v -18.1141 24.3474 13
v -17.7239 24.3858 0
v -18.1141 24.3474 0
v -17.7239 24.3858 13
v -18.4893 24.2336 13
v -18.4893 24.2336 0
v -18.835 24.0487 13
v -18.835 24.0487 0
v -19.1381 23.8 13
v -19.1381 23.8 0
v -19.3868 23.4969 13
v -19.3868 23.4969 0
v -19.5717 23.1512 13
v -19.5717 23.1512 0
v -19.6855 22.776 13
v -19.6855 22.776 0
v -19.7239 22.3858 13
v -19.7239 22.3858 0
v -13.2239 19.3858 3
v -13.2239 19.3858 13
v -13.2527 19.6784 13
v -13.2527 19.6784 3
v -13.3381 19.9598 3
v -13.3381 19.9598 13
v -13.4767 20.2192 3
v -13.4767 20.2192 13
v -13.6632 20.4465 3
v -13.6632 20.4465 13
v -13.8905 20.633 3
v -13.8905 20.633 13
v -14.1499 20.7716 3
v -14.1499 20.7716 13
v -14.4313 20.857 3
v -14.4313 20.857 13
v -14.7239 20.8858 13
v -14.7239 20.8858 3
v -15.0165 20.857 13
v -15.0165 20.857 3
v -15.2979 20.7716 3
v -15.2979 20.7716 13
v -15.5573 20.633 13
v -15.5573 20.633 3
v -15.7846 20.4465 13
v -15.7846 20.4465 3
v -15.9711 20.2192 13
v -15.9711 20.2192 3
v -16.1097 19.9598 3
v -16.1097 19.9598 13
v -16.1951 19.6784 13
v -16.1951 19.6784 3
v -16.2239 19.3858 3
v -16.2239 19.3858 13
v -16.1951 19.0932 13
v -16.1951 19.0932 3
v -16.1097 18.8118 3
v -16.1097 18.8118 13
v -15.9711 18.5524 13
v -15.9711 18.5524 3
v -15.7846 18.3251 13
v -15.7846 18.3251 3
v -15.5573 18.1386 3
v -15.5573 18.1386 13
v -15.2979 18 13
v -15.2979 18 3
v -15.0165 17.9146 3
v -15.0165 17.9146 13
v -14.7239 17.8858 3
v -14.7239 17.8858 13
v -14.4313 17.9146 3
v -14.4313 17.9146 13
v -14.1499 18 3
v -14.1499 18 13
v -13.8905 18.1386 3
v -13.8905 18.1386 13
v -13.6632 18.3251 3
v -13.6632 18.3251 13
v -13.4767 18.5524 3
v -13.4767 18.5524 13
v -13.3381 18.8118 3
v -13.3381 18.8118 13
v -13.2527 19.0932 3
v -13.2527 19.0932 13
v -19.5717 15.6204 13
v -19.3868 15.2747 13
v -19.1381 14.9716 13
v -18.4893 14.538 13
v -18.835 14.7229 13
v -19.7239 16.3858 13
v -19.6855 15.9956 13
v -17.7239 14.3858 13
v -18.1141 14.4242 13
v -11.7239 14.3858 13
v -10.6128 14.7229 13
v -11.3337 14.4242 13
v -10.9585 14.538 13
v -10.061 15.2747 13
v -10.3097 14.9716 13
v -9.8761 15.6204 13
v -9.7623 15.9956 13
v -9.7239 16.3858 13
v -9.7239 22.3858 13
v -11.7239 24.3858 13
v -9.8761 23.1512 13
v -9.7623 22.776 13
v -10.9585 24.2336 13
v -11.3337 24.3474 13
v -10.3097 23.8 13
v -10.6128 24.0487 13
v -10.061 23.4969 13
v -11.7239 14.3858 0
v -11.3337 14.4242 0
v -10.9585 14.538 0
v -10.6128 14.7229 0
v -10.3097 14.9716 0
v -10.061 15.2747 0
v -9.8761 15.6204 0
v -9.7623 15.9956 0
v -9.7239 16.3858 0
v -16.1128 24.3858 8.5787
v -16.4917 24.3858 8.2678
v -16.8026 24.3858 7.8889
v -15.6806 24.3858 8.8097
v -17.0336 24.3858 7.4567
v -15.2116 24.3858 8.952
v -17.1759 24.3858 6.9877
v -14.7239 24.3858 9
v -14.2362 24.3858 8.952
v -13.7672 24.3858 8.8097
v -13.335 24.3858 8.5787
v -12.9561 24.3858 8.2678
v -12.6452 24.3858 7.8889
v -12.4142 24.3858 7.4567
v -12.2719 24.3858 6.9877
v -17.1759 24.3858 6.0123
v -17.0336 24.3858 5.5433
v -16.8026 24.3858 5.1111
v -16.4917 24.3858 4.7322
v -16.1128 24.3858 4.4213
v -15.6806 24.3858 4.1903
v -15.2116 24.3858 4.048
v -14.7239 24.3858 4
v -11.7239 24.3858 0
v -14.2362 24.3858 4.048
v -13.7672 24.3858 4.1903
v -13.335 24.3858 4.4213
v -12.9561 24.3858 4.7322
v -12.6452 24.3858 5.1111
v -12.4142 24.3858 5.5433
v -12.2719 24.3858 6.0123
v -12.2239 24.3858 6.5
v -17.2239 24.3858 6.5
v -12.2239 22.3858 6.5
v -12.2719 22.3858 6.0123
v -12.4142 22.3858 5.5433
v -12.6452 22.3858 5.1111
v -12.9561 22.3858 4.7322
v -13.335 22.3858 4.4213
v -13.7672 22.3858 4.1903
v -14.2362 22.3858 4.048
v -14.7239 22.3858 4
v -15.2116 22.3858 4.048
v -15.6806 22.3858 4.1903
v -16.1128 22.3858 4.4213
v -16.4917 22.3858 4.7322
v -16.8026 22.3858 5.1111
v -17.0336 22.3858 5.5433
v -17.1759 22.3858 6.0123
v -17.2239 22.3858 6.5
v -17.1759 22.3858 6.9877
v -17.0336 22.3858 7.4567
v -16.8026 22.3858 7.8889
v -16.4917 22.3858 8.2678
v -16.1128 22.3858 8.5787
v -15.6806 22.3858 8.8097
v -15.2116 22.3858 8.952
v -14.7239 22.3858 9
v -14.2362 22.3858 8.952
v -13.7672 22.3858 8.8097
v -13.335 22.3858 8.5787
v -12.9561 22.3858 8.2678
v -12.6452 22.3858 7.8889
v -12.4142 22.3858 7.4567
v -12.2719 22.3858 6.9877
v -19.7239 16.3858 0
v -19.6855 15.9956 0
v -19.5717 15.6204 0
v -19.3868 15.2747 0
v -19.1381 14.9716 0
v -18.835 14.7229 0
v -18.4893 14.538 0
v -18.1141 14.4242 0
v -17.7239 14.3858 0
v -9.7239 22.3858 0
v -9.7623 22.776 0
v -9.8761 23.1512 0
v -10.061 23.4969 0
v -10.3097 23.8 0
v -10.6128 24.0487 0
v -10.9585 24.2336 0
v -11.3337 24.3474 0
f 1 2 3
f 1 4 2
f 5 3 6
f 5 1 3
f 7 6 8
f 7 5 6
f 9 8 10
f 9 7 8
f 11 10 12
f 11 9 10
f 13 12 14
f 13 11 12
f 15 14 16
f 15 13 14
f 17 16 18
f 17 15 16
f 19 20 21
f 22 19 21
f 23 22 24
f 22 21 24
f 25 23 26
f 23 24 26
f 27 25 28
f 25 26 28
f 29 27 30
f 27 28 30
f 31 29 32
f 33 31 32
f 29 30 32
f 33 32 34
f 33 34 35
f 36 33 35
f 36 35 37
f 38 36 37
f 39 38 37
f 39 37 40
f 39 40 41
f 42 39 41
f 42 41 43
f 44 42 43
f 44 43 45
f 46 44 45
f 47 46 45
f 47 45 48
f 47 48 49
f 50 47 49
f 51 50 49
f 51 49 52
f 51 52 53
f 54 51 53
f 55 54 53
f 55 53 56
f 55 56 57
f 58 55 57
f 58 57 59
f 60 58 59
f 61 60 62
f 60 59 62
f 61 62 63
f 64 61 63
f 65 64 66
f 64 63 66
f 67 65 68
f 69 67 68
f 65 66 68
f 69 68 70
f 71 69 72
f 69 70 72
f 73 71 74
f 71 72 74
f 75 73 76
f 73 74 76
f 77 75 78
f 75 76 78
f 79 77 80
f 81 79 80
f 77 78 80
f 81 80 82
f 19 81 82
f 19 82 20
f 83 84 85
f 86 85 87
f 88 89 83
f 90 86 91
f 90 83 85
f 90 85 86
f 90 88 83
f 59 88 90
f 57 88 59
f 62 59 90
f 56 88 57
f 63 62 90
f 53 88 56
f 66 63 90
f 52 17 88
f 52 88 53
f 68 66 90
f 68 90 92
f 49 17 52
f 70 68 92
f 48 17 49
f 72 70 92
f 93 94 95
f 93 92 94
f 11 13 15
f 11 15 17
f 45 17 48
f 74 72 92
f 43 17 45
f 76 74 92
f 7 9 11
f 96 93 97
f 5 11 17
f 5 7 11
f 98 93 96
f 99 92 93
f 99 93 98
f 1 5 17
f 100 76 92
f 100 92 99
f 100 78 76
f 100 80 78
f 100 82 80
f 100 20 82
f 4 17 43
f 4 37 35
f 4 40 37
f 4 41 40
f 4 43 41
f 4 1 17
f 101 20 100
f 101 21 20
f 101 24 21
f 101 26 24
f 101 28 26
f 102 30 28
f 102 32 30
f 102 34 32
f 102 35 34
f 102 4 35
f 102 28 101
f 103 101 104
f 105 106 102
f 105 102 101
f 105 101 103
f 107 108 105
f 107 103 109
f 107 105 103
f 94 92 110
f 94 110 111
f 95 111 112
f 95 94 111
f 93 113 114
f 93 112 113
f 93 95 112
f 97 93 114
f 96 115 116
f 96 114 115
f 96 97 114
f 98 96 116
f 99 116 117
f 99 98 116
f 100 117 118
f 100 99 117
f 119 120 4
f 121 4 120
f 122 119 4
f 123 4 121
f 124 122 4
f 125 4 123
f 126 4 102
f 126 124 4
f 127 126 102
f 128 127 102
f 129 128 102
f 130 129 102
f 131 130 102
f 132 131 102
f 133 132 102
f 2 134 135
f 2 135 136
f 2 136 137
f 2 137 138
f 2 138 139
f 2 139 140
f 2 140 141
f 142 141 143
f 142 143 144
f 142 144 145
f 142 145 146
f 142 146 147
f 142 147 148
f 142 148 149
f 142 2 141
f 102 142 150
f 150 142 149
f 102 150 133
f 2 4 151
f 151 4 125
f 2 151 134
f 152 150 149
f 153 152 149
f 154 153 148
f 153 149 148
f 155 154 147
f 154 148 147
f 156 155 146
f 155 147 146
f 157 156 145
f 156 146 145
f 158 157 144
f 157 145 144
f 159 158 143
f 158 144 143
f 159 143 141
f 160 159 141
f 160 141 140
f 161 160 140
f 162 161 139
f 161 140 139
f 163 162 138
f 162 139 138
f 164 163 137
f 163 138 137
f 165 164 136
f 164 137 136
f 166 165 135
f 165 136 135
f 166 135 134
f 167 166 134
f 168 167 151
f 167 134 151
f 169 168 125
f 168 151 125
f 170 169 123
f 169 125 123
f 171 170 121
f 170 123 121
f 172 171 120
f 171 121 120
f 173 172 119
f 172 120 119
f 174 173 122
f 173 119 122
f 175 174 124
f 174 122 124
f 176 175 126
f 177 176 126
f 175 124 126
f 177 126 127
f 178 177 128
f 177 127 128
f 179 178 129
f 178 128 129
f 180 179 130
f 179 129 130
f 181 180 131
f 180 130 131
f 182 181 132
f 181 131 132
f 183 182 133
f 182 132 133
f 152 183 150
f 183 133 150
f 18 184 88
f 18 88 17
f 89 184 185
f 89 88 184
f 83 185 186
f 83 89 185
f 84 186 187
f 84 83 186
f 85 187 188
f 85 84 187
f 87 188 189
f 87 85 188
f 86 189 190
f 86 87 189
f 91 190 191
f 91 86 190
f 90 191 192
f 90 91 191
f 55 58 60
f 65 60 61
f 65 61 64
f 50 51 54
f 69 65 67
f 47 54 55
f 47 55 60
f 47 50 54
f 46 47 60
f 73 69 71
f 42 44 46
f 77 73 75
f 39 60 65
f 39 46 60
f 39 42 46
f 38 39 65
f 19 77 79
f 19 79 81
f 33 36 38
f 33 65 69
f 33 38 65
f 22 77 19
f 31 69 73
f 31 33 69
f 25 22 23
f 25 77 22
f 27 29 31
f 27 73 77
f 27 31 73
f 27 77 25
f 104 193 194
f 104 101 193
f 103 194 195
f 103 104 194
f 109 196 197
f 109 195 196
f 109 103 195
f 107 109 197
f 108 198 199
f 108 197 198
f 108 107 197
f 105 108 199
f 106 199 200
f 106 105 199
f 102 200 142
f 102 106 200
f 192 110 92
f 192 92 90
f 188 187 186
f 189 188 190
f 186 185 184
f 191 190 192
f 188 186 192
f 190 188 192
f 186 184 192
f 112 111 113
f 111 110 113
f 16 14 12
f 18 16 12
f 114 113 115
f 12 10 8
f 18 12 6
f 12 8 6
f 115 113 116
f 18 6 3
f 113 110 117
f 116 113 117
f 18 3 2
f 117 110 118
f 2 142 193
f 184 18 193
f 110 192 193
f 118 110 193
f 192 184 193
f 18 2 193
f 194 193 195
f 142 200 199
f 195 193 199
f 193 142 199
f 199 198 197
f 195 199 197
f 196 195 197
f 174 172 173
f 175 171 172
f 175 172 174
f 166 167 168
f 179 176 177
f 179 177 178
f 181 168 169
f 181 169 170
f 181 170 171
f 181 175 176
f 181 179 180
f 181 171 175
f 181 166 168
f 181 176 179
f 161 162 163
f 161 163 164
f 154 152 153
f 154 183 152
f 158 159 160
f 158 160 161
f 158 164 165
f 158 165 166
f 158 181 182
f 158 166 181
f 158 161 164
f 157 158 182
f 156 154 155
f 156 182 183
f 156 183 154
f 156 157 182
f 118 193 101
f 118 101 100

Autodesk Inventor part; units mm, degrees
ref_plane "YZ Plane" through (0, 0, 0) normal (1, 0, 0) x (0, 1, 0)
ref_plane "XZ Plane" through (0, 0, 0) normal (0, 1, 0) x (-1, 0, 0)
ref_plane "XY Plane" through (0, 0, 0) normal (0, 0, 1) x (1, 0, 0)
sketch "Sketch1" plane through (0, 0, 0) normal (0, 0, 1) x (1, 0, 0)
  line L0 (-19.7239, 24.3858) -> (-9.7239, 24.3858)
  line L1 (-9.7239, 24.3858) -> (-9.7239, 14.3858)
  line L2 (-9.7239, 14.3858) -> (-19.7239, 14.3858)
  line L3 (-19.7239, 14.3858) -> (-19.7239, 24.3858)
  line L4 (-19.7239, 24.3858) -> (-9.7239, 14.3858) construction
  line L5 (-9.7239, 24.3858) -> (-19.7239, 14.3858) construction
  line L6 (-7.848, 12.2173) -> (-10.7345, 12.2561) projected
  line L7 (-7.848, 12.2173) -> (-12.5422, 20.6065) projected
  arc A0 (-12.5422, 20.6065) -> (-16.9056, 18.165) centre (-14.7239, 19.3858) ccw projected
  line L8 (-16.9056, 18.165) -> (-10.8018, 7.2566) projected
  line L9 (-10.7345, 12.2561) -> (-10.8018, 7.2566) projected
  circle A1 centre (-14.7239, 19.3858) radius 1.5 projected
  circle A2 centre (-14.7239, 19.3858) radius 1.5 projected
  line L10 (-68.8088, 12.3105) -> (-68.8088, 17.3105) projected
  arc A3 (-68.8088, 17.3105) -> (-78.8088, 17.3105) centre (-73.8088, 17.3105) ccw projected
  line L11 (-78.8088, 17.3105) -> (-78.8088, -37.6895) projected
  line L12 (-78.8088, -37.6895) -> (-33.8088, -37.6895) projected
  line L13 (-33.8088, -37.6895) -> (-28.8088, -32.6895) projected
  line L14 (-28.8088, -32.6895) -> (-73.8088, -32.6895) projected
  line L15 (-73.8088, -32.6895) -> (-73.8088, 7.3105) projected
  line L16 (-73.8088, 7.3105) -> (-18.8088, 7.3105) projected
  line L17 (-18.8088, 7.3105) -> (-12.5588, 18.1358) projected
  arc A4 (-12.5588, 18.1358) -> (-16.8889, 20.6358) centre (-14.7239, 19.3858) ccw projected
  line L18 (-16.8889, 20.6358) -> (-21.6956, 12.3105) projected
  line L19 (-21.6956, 12.3105) -> (-68.8088, 12.3105) projected
  circle A5 centre (-73.8088, 17.3105) radius 2.5 projected
  dimension "d0" = 10
  dimension "d1" = 10
extrude "Extrusion1" add sketch "Sketch1" along normal blind 13 contours L0 L1 L7 A0 L18 L3 | L18 A0 L8 L2 L3 | L1 L2 L17 A4 L7 | A0 A4 L17 L2 L8 | A1
fillet "Fillet1" radius 2 4 edges at (-9.7239, 24.3858, 6.5) (-9.7239, 14.3858, 6.5) (-19.7239, 24.3858, 6.5) (-19.7239, 14.3858, 6.5)
sketch "Sketch2" plane through (0, 0, 13) normal (0, 0, 1) x (1, 0, 0)
  circle A0 centre (-14.7239, 19.3858) radius 1.5 projected
  point P0 (0, 0)
extrude "Extrusion2" cut sketch "Sketch2" against normal blind 10
sketch "Sketch3" plane through (-17.7239, 24.3858, 0) normal (0, 1, 0) x (1, 0, 0)
  line L0 (0, -13) -> (0, 0) projected
  line L1 (6, -13) -> (0, -13) projected
  line L2 (6, 0) -> (6, -13) projected
  line L3 (6, 0) -> (0, 0) projected
  line L4 (0, -13) -> (0, 0) projected
  line L5 (0, -6.5) -> (6, -6.5)
  line L6 (6, 0) -> (6, -13) projected
  circle A0 centre (3, -6.5) radius 2.5
  point P0 (17.7239, 0)
  dimension "d7" = 5
extrude "Extrusion3" cut sketch "Sketch3" against normal blind 2 contours A0 L5 | L5 A0
properties part number "Claw Connector New"
